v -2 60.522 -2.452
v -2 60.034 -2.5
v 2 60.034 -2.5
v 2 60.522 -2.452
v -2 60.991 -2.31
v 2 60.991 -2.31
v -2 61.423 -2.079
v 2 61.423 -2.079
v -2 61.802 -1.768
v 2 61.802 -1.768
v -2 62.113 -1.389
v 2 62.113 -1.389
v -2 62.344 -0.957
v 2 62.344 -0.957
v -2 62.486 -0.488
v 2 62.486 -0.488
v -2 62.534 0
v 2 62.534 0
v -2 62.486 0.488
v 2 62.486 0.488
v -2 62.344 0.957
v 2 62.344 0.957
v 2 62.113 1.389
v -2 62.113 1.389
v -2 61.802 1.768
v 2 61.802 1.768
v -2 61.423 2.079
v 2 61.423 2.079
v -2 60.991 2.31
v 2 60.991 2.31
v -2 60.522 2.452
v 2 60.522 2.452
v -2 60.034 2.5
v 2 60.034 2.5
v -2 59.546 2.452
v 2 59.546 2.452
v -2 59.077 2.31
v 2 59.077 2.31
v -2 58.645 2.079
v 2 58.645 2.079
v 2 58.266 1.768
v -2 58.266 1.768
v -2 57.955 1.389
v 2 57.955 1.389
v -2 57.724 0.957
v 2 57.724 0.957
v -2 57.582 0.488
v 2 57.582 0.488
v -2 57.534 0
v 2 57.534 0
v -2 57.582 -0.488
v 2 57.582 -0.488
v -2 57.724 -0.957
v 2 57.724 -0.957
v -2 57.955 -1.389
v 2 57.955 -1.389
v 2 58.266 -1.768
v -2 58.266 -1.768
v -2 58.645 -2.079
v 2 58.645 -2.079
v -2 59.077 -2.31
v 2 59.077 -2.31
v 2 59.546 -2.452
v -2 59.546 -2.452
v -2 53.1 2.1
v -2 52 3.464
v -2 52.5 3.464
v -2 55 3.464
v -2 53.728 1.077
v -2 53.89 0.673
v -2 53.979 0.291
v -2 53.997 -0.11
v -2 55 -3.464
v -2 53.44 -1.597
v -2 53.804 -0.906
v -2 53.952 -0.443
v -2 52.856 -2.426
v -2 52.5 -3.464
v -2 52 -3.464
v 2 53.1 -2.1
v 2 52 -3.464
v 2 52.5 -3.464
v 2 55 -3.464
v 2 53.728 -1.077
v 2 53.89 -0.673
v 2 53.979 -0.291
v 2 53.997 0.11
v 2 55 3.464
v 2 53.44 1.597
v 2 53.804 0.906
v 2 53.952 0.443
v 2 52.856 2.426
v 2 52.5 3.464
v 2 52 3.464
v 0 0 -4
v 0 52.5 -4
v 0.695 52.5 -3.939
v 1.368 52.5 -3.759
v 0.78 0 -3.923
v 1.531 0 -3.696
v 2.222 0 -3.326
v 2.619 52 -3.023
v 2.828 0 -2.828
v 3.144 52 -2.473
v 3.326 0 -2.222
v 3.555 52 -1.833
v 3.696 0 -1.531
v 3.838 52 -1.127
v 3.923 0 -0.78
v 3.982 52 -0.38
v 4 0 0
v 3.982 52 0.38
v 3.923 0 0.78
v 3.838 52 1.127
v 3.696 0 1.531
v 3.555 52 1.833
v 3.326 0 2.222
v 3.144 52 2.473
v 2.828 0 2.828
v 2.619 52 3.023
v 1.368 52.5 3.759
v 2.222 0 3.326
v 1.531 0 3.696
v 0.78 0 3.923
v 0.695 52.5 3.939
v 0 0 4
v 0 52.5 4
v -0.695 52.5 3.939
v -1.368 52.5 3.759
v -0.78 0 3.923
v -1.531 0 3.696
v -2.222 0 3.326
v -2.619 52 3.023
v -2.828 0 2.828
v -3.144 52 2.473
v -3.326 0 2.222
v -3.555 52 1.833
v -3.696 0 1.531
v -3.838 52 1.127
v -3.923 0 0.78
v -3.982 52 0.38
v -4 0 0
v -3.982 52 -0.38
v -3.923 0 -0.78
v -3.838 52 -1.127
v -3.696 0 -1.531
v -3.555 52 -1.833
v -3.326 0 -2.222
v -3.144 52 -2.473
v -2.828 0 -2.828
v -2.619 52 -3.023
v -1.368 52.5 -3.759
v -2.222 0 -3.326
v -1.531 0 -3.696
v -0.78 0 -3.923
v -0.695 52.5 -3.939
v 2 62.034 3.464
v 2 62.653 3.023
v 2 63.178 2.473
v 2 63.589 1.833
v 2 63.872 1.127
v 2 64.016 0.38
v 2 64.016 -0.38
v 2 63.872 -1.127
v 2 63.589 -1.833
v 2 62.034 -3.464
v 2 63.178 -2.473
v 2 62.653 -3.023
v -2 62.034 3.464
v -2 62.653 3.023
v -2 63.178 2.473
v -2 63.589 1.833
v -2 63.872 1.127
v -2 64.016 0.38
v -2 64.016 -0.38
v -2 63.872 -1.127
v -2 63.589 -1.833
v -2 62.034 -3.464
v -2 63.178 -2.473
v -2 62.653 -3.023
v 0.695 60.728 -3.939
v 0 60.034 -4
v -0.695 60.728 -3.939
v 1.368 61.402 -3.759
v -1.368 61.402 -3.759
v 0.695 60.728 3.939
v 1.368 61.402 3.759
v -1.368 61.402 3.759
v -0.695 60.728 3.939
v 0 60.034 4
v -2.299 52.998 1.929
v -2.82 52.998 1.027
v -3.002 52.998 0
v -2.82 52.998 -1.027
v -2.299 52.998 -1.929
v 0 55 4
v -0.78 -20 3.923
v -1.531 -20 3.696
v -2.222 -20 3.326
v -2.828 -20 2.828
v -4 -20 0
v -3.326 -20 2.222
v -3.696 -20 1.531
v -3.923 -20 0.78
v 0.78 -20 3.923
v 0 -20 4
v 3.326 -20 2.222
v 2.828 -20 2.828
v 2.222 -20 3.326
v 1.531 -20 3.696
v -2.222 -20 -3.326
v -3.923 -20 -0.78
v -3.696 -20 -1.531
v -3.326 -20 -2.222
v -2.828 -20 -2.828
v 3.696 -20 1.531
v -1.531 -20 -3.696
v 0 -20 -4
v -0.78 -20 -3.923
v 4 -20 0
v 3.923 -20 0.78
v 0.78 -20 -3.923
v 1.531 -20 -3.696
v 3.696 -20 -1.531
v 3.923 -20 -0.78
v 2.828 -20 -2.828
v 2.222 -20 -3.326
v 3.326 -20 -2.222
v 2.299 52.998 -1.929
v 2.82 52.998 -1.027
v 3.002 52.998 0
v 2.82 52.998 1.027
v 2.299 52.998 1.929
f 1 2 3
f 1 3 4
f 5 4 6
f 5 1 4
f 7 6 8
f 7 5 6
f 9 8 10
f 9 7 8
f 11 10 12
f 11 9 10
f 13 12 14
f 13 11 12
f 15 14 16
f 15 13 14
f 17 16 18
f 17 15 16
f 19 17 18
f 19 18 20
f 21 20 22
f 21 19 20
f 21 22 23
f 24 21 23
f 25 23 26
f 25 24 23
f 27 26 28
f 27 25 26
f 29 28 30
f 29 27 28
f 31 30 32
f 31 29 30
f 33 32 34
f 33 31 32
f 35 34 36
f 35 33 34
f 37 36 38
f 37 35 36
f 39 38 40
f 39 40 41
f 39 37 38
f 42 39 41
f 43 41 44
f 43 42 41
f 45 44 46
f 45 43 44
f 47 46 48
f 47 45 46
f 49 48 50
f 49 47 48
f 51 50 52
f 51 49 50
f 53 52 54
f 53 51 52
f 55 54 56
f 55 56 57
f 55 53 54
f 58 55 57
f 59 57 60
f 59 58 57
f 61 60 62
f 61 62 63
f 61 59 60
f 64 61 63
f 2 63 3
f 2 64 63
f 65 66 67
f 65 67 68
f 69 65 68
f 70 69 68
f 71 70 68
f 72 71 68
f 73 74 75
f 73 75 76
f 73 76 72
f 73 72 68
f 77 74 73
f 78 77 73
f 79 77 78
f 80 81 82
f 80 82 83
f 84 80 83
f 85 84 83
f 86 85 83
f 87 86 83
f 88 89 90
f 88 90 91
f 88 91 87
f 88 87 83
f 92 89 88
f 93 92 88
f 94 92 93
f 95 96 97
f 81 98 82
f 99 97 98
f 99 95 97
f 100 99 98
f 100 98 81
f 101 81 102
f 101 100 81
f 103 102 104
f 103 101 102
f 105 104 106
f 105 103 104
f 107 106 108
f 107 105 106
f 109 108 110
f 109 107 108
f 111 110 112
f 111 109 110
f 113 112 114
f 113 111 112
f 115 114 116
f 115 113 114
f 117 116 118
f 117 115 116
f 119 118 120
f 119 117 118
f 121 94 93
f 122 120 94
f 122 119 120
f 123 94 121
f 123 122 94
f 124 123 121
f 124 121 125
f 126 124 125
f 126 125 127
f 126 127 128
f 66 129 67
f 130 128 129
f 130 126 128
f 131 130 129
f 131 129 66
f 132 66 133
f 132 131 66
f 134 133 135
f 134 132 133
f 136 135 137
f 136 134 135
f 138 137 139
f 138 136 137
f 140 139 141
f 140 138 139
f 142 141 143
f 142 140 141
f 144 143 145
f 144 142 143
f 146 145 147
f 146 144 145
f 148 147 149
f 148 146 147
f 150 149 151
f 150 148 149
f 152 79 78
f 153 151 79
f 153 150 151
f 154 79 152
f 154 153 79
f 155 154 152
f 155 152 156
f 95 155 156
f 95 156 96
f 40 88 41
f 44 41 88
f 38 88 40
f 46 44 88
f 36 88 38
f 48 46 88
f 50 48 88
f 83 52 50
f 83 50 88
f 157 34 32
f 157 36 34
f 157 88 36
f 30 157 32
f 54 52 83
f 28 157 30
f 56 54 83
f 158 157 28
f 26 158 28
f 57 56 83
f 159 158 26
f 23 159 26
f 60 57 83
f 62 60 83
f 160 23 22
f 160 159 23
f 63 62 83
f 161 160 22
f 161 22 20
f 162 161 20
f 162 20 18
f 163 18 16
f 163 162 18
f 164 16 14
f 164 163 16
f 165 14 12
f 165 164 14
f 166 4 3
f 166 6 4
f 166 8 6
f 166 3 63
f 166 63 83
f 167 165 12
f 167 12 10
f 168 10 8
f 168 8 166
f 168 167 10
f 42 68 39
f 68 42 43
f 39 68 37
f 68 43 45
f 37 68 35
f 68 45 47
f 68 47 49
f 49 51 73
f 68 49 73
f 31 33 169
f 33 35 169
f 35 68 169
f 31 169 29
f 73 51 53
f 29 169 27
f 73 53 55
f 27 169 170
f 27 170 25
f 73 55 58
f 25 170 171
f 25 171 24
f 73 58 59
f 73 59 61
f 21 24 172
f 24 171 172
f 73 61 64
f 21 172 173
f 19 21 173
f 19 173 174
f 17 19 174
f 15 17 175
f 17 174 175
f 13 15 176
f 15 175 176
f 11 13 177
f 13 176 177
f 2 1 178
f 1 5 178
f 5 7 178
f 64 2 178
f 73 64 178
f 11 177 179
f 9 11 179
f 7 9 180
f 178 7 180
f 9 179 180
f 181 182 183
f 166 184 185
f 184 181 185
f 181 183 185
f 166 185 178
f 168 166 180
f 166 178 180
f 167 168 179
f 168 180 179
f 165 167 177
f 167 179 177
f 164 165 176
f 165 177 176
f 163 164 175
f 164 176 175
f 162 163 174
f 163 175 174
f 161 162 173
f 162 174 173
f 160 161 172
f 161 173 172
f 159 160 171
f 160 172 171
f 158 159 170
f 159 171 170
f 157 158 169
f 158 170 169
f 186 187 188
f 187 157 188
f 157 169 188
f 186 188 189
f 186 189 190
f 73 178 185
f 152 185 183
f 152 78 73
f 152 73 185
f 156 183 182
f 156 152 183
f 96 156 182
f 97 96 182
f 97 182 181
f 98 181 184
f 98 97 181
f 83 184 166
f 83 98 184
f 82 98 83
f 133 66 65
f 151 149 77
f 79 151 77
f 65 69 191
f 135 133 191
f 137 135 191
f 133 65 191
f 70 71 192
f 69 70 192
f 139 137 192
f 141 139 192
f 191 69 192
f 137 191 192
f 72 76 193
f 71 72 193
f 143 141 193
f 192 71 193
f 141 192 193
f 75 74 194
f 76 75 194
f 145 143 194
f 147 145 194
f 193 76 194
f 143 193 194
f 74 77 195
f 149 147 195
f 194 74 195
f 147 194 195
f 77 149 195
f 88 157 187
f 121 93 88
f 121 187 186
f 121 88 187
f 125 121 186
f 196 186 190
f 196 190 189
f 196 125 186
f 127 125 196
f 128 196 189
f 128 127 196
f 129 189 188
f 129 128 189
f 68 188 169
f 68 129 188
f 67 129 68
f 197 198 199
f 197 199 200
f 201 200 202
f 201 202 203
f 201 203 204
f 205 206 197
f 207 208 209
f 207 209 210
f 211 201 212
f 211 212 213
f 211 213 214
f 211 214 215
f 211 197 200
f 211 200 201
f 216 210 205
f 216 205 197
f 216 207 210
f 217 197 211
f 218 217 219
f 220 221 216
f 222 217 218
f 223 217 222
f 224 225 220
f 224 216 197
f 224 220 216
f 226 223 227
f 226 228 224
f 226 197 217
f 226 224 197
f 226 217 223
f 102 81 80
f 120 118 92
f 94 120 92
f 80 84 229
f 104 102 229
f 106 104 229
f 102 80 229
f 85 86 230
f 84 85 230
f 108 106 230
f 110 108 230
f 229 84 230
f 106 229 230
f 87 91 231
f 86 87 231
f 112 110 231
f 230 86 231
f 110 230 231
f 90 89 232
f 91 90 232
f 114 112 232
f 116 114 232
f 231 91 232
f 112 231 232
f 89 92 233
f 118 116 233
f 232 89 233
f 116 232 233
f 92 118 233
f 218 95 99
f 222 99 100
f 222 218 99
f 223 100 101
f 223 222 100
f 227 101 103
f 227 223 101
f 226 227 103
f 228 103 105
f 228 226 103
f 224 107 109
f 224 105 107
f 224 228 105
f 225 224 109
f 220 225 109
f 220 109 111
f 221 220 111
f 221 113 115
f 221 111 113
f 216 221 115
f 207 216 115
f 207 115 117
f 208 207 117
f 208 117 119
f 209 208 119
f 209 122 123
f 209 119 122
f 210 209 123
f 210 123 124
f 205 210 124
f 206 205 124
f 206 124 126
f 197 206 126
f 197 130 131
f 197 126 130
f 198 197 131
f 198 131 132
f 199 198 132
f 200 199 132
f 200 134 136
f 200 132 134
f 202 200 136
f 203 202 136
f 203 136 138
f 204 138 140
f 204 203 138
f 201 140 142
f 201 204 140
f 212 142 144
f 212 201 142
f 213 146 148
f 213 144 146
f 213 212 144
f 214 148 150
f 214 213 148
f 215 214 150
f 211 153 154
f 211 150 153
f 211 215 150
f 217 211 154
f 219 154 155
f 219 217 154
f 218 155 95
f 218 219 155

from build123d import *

# Parameters (mm, degrees)
SKETCH1_R                = 4
BOSS_EXTRUDE1_DEPTH      = 55
BOSS_EXTRUDE2_DEPTH      = 2
BOSS_EXTRUDE2_DEPTH_BACK = 2
SKETCH2_R                = 2.5
SKETCH3_R                = 5.5
BOSS_EXTRUDE3_DEPTH      = 3
CHAMFER1_SIZE            = 2
BOSS_EXTRUDE4_START      = 20
SKETCH4_R                = 4
BOSS_EXTRUDE4_DEPTH      = 20
SKETCH5_OUTSIDE_W        = 30.092
SKETCH5_OUTSIDE_H        = 30.092
SKETCH5_OUTSIDE_R        = 4
CUT_EXTRUDE1_DEPTH       = 85.393094269
CHAMFER2_SIZE            = 3
CHAMFER3_SIZE            = 3


with BuildPart() as part:
    # Sketch1 → Boss-Extrude1 (new body)
    with BuildSketch(Plane(origin=(0, 0, 0), x_dir=(1, 0, 0), z_dir=(0, 1, 0))):
        with Locations(Location((0, 0, 0), (0, 0, 270))):
            Circle(SKETCH1_R)
    extrude(amount=BOSS_EXTRUDE1_DEPTH)

    # Sketch2 → Boss-Extrude2 (add, two sides: drawn at the far end of the back side and taken through both)
    with BuildSketch(Plane(origin=(0, 0, 0), x_dir=(0, 0, -1), z_dir=(1, 0, 0)).offset(-BOSS_EXTRUDE2_DEPTH_BACK)):
        with BuildLine():
            Line((-4, 60.033888167), (-4, 55))
            Line((-4, 55), (4, 55))
            Line((4, 55), (4, 60.033888167))
            ThreePointArc((4, 60.033888167), (0, 64.033888167), (-4, 60.033888167))
        make_face()
        with Locations((0, 60.033888167)):
            Circle(SKETCH2_R, mode=Mode.SUBTRACT)
    extrude(amount=BOSS_EXTRUDE2_DEPTH + BOSS_EXTRUDE2_DEPTH_BACK)

    # Sketch3 → Boss-Extrude3 (add)
    with BuildSketch(Plane.XZ.offset(-55)):
        with Locations(Location((0, 0, 0), (0, 0, 270))):
            Circle(SKETCH3_R)
    extrude(amount=BOSS_EXTRUDE3_DEPTH)

    # Chamfer1
    # the kernel refuses this chamfer: 2 mm, written as the material it takes off along each edge
    with BuildSketch(Plane(origin=(0, 52, 0), x_dir=(0, 0, -1), z_dir=(-1, 0, 0))) as chamfer1_piece_1_section:
        Polygon((5.5 - CHAMFER1_SIZE, 0), (5.5, -CHAMFER1_SIZE), (5.5, 0), align=None)
    chamfer1_piece_1 = revolve(axis=Axis((0, 52, 0), (0, -1, 0)), mode=Mode.PRIVATE)
    chamfer1_piece_1 = chamfer1_piece_1 - Plane(origin=(0, 53.250152147, 0), x_dir=(0, 0, 1), z_dir=(0, -1, 0)) * Cylinder(4, 22, mode=Mode.PRIVATE)
    add(chamfer1_piece_1, mode=Mode.SUBTRACT)

    # Sketch4 → Boss-Extrude4 (add)
    with BuildSketch(Plane.XZ.offset(BOSS_EXTRUDE4_START)):
        with Locations(Location((0, 0, 0), (0, 0, 270))):
            Circle(SKETCH4_R)
    extrude(amount=-BOSS_EXTRUDE4_DEPTH)

    # Sketch5 outside → Cut-Extrude1 (cut, through all)
    with BuildSketch(Plane.XZ.offset(20)):
        Rectangle(SKETCH5_OUTSIDE_W, SKETCH5_OUTSIDE_H)
        with Locations(Location((0, 0, 0), (0, 0, 270))):
            Circle(SKETCH5_OUTSIDE_R, mode=Mode.SUBTRACT)
    extrude(amount=-CUT_EXTRUDE1_DEPTH, mode=Mode.SUBTRACT)

    # Chamfer2
    # the kernel refuses this chamfer: 3 mm, written as the material it takes off along each edge
    with BuildSketch(Plane(origin=(0, 55, 0), x_dir=(-0.9865404268898706, 0, -0.16351754068586014), z_dir=(-0.16351754068586014, 0, 0.9865404268898706))) as chamfer2_piece_1_section:
        Polygon((4, CHAMFER2_SIZE), (4 - CHAMFER2_SIZE, 0), (4, 0), align=None)
    chamfer2_piece_1 = revolve(axis=Axis((0, 55, 0), (0, -1, 0)), revolution_arc=341.177747572, mode=Mode.PRIVATE)
    chamfer2_piece_1 = split(chamfer2_piece_1, bisect_by=Plane(origin=(2, 53.817100825, 1e-09), z_dir=(1, 0, 0)), keep=Keep.TOP, mode=Mode.PRIVATE)
    add(chamfer2_piece_1, mode=Mode.SUBTRACT)

    # Chamfer3
    # the kernel refuses this chamfer: 3 mm, written as the material it takes off along each edge
    with BuildSketch(Plane(origin=(0, 55, 0), x_dir=(0.9865404268898706, 0, 0.16351754068586002), z_dir=(0.16351754068586002, 0, -0.9865404268898706))) as chamfer3_piece_1_section:
        Polygon((4, CHAMFER3_SIZE), (4 - CHAMFER3_SIZE, 0), (4, 0), align=None)
    chamfer3_piece_1 = revolve(axis=Axis((0, 55, 0), (0, -1, 0)), revolution_arc=341.177747572, mode=Mode.PRIVATE)
    chamfer3_piece_1 = split(chamfer3_piece_1, bisect_by=Plane(origin=(-2, 53.794161032, -4e-09), z_dir=(-1, 0, 0)), keep=Keep.TOP, mode=Mode.PRIVATE)
    add(chamfer3_piece_1, mode=Mode.SUBTRACT)


solid = part.part
